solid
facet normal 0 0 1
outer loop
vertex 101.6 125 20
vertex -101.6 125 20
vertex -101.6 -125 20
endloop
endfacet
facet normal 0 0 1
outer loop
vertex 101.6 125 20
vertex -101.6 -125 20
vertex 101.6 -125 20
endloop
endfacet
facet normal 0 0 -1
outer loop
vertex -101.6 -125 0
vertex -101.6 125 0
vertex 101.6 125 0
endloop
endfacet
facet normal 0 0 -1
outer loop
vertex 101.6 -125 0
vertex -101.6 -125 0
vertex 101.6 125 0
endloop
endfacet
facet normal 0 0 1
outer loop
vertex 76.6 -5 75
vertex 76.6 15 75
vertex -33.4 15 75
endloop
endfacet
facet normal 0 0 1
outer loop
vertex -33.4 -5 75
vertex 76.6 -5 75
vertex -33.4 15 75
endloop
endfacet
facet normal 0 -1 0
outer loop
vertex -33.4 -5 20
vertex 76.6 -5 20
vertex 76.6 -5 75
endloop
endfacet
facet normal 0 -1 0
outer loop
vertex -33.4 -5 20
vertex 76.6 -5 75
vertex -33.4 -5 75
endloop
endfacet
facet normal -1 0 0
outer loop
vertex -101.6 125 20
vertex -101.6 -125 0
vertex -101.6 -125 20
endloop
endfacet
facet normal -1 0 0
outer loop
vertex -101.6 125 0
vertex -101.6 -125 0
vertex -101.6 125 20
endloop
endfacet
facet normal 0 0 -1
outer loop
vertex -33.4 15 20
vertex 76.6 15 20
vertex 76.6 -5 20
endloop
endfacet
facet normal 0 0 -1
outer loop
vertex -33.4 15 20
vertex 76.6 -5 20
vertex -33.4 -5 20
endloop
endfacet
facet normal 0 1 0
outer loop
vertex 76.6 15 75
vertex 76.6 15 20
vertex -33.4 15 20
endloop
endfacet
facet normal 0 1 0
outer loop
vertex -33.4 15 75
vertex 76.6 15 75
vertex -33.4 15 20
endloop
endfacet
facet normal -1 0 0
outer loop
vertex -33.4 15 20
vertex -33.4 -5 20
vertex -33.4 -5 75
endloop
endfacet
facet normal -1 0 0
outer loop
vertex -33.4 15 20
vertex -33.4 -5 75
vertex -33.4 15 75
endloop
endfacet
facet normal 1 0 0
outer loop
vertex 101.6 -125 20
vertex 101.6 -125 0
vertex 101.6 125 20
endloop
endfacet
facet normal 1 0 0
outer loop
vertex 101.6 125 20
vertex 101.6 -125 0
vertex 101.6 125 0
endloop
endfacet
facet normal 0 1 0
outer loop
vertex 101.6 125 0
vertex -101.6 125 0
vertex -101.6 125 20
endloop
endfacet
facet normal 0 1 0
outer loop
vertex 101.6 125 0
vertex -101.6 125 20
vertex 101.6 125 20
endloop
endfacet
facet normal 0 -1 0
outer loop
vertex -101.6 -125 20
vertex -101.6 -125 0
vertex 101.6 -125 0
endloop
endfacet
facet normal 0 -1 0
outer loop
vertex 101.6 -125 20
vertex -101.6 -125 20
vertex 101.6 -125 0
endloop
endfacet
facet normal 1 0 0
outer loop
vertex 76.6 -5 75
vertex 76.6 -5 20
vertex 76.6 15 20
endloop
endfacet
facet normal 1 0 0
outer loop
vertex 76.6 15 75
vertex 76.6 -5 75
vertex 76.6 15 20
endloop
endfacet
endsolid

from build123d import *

# Parameters (mm, degrees)
SKETCH1_W           = 203.2
SKETCH1_H           = 250
BOSS_EXTRUDE1_DEPTH = 20
BOSS_EXTRUDE2_START = -20
SKETCH2_W           = 110
SKETCH2_H           = 20
BOSS_EXTRUDE2_DEPTH = 55


with BuildPart() as part:
    # Sketch1 → Boss-Extrude1 (new body)
    with BuildSketch(Plane.XY):
        Rectangle(SKETCH1_W, SKETCH1_H)
    extrude(amount=BOSS_EXTRUDE1_DEPTH)


with BuildPart() as body_2:
    # Sketch2 → Boss-Extrude2 (new body)
    with BuildSketch(Plane(origin=(0, 0, 0), x_dir=(-1, 0, 0), z_dir=(0, 0, -1)).offset(BOSS_EXTRUDE2_START)):
        with Locations((-21.6, 5)):
            Rectangle(SKETCH2_W, SKETCH2_H)
    extrude(amount=-BOSS_EXTRUDE2_DEPTH)


solid = Compound([part.part, body_2.part])
